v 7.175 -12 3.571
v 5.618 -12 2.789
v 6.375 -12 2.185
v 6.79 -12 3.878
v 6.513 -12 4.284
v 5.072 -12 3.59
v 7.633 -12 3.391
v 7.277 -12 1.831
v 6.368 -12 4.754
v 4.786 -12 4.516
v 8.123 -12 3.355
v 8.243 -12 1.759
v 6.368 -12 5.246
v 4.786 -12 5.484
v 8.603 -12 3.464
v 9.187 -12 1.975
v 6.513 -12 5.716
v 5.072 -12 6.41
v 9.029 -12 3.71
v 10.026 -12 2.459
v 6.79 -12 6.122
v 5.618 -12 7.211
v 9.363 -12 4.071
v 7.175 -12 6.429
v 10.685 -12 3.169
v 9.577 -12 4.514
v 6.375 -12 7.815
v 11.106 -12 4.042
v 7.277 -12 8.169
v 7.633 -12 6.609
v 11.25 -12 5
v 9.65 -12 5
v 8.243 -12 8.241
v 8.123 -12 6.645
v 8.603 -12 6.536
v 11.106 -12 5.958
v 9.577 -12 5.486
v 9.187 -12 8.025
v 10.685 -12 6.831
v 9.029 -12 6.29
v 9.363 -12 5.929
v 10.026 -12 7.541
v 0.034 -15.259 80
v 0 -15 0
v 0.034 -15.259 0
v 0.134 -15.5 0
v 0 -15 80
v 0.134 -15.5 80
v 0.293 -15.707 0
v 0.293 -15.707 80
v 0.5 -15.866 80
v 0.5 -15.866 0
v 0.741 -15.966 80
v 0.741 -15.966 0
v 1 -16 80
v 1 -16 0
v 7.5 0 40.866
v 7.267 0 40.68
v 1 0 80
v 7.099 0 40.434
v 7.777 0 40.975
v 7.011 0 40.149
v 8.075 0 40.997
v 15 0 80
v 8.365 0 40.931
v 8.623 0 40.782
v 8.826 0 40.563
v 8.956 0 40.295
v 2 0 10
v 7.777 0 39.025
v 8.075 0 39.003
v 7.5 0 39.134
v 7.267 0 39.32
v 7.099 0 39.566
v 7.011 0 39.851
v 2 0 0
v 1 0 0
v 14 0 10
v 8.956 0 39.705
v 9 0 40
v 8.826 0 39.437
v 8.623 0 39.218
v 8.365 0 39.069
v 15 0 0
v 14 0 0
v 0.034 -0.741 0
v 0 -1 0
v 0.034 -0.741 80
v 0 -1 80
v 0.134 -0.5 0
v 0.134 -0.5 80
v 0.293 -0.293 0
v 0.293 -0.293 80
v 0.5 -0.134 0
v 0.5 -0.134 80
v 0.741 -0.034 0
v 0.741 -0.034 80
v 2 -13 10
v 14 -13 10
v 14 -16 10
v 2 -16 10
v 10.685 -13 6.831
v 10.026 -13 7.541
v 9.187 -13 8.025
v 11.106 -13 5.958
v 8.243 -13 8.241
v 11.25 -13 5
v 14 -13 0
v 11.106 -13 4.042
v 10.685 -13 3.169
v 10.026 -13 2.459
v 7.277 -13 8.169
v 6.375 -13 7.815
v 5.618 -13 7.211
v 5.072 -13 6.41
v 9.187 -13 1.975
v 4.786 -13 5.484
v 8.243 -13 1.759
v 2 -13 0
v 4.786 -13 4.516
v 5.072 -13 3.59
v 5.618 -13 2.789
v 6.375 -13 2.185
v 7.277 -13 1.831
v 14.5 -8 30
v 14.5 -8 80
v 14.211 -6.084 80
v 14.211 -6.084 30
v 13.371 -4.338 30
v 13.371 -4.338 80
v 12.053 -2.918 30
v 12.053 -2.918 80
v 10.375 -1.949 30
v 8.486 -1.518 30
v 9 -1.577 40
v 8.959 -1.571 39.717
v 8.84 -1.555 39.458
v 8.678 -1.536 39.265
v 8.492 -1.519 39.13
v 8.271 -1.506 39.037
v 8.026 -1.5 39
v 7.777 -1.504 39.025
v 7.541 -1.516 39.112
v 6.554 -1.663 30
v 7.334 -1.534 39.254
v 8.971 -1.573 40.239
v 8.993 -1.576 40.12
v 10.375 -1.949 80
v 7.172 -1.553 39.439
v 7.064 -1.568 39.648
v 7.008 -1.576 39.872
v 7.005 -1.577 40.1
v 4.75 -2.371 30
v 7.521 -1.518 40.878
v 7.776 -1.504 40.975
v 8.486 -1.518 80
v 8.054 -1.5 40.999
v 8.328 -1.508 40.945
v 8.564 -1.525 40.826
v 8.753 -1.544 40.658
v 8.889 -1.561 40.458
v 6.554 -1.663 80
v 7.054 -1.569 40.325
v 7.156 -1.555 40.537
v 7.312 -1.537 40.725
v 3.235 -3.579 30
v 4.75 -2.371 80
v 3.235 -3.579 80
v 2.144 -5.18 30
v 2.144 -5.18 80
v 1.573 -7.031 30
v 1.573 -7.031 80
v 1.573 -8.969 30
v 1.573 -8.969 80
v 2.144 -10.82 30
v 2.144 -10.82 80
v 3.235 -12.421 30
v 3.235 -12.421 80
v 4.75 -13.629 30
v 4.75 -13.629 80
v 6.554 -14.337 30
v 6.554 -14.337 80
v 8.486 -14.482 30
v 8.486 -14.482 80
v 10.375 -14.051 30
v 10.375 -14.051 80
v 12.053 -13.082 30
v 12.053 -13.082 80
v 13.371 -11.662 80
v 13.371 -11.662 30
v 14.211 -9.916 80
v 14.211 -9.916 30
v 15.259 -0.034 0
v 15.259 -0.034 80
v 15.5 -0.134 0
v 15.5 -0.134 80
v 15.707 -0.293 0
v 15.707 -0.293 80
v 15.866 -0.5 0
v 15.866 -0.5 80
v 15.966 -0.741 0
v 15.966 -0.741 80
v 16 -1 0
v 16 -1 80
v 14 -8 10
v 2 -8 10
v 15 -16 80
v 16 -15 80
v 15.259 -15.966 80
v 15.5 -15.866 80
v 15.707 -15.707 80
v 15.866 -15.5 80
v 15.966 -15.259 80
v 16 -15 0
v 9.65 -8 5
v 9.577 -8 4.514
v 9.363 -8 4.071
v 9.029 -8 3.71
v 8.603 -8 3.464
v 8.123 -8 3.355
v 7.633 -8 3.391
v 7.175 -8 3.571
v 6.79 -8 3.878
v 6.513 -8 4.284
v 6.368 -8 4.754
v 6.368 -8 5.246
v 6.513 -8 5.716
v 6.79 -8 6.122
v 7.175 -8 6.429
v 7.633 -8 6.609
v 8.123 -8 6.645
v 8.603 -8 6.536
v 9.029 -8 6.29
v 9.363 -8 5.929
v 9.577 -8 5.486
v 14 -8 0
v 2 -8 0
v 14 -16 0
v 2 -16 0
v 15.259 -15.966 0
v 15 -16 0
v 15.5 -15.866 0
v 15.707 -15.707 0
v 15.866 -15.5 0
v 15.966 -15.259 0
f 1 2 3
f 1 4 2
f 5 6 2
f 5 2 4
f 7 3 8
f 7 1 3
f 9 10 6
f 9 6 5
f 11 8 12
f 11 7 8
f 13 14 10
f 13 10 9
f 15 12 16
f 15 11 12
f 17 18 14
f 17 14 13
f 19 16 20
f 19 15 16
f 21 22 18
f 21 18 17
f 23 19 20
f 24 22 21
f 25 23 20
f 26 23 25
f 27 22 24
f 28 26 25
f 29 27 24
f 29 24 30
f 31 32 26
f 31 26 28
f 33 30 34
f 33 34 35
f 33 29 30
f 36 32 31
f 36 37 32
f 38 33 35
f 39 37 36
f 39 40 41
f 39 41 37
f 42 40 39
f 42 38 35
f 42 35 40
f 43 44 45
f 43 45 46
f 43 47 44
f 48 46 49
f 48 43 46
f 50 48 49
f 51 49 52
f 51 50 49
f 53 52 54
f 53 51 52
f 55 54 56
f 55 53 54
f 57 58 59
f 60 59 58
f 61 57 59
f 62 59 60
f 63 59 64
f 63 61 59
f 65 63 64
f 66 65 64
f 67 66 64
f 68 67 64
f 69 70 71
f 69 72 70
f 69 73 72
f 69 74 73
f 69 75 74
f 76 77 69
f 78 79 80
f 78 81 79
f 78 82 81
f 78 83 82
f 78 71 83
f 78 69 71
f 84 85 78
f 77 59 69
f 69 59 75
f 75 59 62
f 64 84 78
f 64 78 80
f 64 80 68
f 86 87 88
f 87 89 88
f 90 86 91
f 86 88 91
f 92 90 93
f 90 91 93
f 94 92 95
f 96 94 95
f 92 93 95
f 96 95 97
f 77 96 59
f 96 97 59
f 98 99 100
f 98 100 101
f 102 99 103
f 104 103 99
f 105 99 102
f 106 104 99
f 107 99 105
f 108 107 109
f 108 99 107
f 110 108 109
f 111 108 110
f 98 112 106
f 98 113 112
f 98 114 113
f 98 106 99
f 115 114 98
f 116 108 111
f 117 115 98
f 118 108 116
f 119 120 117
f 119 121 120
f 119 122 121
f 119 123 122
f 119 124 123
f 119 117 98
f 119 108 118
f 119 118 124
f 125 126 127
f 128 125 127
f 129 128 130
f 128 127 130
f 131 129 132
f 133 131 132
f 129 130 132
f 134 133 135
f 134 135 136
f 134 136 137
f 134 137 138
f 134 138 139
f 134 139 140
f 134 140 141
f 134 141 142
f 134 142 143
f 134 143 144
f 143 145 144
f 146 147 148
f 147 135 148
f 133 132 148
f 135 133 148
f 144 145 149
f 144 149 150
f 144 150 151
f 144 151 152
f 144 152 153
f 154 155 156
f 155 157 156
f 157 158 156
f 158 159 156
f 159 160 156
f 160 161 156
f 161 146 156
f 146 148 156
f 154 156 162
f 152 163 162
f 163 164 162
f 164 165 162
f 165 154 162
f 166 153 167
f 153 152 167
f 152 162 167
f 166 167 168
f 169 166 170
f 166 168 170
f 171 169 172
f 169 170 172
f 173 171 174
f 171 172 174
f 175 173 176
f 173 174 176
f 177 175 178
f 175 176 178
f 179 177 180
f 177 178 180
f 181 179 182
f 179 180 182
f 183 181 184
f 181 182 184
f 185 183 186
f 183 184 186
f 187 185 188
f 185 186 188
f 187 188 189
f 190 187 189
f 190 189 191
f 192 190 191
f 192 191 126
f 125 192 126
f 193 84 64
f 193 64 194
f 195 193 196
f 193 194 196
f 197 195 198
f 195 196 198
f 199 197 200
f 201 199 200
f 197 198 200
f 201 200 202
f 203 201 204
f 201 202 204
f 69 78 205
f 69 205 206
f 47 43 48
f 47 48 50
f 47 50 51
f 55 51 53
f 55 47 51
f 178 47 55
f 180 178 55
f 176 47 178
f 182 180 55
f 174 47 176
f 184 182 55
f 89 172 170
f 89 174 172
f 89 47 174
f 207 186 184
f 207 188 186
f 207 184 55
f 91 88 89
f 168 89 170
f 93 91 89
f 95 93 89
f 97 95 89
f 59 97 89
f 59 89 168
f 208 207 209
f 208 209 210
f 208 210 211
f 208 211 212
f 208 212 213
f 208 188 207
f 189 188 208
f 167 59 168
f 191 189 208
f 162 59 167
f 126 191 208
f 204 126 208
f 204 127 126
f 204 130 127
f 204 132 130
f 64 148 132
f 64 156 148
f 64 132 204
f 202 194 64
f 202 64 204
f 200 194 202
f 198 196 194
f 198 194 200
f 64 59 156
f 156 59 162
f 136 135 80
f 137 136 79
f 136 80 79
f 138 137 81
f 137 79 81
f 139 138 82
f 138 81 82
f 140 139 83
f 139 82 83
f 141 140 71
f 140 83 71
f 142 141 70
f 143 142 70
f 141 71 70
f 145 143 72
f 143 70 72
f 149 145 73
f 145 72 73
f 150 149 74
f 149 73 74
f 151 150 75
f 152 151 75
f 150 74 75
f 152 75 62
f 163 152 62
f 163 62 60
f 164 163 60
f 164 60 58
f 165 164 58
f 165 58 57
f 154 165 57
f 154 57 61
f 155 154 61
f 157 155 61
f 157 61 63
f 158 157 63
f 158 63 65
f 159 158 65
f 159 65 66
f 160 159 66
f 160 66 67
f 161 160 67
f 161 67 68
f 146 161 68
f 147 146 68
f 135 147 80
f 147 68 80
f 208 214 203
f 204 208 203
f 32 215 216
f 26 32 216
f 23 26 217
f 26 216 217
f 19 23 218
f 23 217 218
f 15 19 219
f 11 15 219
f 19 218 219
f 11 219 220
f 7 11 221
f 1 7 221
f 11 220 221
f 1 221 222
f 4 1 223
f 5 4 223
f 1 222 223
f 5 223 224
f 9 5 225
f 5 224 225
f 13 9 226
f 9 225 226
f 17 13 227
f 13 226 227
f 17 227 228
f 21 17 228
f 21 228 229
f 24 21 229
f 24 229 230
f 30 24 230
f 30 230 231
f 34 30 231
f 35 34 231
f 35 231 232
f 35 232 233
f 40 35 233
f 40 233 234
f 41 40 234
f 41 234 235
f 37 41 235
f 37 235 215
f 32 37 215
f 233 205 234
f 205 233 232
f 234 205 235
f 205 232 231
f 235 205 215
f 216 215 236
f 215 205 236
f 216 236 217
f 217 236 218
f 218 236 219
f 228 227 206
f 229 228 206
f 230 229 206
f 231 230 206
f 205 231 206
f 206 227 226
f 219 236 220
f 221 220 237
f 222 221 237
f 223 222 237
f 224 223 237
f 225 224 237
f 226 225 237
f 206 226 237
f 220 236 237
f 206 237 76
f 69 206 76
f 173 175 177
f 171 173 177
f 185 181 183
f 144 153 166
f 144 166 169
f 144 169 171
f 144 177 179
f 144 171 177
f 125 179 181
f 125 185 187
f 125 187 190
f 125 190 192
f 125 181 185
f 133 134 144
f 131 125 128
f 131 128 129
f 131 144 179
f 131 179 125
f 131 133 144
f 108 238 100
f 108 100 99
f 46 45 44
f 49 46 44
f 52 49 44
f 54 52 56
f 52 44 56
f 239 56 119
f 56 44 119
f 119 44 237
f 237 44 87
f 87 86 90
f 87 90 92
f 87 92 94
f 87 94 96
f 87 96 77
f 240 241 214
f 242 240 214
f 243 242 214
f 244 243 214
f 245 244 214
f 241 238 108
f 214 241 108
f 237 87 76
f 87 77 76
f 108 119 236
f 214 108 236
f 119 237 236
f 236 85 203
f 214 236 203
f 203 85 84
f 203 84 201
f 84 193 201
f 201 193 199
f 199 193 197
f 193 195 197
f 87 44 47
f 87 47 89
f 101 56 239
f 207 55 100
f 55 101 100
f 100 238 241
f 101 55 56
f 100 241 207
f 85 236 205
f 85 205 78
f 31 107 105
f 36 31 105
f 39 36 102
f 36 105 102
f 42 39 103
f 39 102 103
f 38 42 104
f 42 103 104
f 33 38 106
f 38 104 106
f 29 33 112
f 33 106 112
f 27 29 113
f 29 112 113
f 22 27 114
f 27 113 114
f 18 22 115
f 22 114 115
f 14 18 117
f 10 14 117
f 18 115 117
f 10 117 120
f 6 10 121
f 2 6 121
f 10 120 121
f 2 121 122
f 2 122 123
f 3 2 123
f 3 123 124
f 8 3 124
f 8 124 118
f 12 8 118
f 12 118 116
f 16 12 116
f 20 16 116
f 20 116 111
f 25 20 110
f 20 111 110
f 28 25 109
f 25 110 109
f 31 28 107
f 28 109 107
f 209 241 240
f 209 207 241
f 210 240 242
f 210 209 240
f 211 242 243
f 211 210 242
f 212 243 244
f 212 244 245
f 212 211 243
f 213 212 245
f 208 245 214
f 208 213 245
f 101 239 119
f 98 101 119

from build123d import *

# Parameters (mm, degrees)
SKETCH_1_W             = 16
SKETCH_1_H             = 16
EXTRUDE_1_DEPTH        = 80
SKETCH_2_R             = 6.5
CUT_EXTRUDE_1_DEPTH    = 50
SKETCH_10_W            = 12
SKETCH_10_H            = 8
SKETCH_10_H_2          = 3
CUT_EXTRUDE_2_DEPTH    = 10
SKETCH_11_R            = 3.25
CUT_EXTRUDE_5_DEPTH    = 1
HOLE_WIZARD_M4_1_D     = 3.3
HOLE_WIZARD_M4_1_DEPTH = 4
CUT_EXTRUDE_6_REACH    = 18
SKETCH_14_R            = 1
FILLET_1_R             = 1


with BuildPart() as part:
    # 草图1 → 凸台-拉伸1 (new body)
    with BuildSketch(Plane.XY):
        with Locations((8, -8)):
            Rectangle(SKETCH_1_W, SKETCH_1_H)
    extrude(amount=EXTRUDE_1_DEPTH)

    # 草图2 → 切除-拉伸1 (cut)
    with BuildSketch(Plane.XY.offset(80)):
        with Locations((8, -8)):
            Circle(SKETCH_2_R)
    extrude(amount=-CUT_EXTRUDE_1_DEPTH, mode=Mode.SUBTRACT)

    # 草图10 → 切除-拉伸2 (cut)
    with BuildSketch(Plane(origin=(0, 0, 0), x_dir=(-1, 0, 0), z_dir=(0, 0, -1))):
        with Locations((-8, -4)):
            Rectangle(SKETCH_10_W, SKETCH_10_H)
        with Locations((-8, -14.5)):
            Rectangle(SKETCH_10_W, SKETCH_10_H_2)
    extrude(amount=-CUT_EXTRUDE_2_DEPTH, mode=Mode.SUBTRACT)

    # 草图11 → 切除-拉伸5 (cut)
    with BuildSketch(Plane.XZ.offset(13)):
        with Locations((8, 5)):
            Circle(SKETCH_11_R)
    extrude(amount=-CUT_EXTRUDE_5_DEPTH, mode=Mode.SUBTRACT)

    # M4 螺纹孔的螺纹孔钻头1
    with Locations(Plane(origin=(0, -12, 0), x_dir=(-1, 0, 0), z_dir=(0, -1, 0))):
        with Locations((-8, -5)):
            Hole(HOLE_WIZARD_M4_1_D / 2, depth=HOLE_WIZARD_M4_1_DEPTH)

    # 草图14 → 切除-拉伸6 (cut, up to next)
    with BuildSketch(Plane(origin=(0, 0, 0), x_dir=(1, 0, 0), z_dir=(0, 1, 0)), mode=Mode.PRIVATE) as cut_extrude_6_sk1:
        with Locations((8, -40)):
            Circle(SKETCH_14_R)
    cut_extrude_6_tool1 = extrude(cut_extrude_6_sk1.sketch, amount=-CUT_EXTRUDE_6_REACH, mode=Mode.PRIVATE) & part.part
    add(cut_extrude_6_tool1.solids().sort_by_distance((8, 0, 40))[0], mode=Mode.SUBTRACT)

    # 圆角1
    fillet_1_edges = [part.edges().sort_by_distance(p)[0] for p in [
        (0, 0, 40),
        (16, 0, 40),
        (16, -16, 40),
        (0, -16, 40),
    ]]
    fillet(fillet_1_edges, radius=FILLET_1_R)


solid = part.part
